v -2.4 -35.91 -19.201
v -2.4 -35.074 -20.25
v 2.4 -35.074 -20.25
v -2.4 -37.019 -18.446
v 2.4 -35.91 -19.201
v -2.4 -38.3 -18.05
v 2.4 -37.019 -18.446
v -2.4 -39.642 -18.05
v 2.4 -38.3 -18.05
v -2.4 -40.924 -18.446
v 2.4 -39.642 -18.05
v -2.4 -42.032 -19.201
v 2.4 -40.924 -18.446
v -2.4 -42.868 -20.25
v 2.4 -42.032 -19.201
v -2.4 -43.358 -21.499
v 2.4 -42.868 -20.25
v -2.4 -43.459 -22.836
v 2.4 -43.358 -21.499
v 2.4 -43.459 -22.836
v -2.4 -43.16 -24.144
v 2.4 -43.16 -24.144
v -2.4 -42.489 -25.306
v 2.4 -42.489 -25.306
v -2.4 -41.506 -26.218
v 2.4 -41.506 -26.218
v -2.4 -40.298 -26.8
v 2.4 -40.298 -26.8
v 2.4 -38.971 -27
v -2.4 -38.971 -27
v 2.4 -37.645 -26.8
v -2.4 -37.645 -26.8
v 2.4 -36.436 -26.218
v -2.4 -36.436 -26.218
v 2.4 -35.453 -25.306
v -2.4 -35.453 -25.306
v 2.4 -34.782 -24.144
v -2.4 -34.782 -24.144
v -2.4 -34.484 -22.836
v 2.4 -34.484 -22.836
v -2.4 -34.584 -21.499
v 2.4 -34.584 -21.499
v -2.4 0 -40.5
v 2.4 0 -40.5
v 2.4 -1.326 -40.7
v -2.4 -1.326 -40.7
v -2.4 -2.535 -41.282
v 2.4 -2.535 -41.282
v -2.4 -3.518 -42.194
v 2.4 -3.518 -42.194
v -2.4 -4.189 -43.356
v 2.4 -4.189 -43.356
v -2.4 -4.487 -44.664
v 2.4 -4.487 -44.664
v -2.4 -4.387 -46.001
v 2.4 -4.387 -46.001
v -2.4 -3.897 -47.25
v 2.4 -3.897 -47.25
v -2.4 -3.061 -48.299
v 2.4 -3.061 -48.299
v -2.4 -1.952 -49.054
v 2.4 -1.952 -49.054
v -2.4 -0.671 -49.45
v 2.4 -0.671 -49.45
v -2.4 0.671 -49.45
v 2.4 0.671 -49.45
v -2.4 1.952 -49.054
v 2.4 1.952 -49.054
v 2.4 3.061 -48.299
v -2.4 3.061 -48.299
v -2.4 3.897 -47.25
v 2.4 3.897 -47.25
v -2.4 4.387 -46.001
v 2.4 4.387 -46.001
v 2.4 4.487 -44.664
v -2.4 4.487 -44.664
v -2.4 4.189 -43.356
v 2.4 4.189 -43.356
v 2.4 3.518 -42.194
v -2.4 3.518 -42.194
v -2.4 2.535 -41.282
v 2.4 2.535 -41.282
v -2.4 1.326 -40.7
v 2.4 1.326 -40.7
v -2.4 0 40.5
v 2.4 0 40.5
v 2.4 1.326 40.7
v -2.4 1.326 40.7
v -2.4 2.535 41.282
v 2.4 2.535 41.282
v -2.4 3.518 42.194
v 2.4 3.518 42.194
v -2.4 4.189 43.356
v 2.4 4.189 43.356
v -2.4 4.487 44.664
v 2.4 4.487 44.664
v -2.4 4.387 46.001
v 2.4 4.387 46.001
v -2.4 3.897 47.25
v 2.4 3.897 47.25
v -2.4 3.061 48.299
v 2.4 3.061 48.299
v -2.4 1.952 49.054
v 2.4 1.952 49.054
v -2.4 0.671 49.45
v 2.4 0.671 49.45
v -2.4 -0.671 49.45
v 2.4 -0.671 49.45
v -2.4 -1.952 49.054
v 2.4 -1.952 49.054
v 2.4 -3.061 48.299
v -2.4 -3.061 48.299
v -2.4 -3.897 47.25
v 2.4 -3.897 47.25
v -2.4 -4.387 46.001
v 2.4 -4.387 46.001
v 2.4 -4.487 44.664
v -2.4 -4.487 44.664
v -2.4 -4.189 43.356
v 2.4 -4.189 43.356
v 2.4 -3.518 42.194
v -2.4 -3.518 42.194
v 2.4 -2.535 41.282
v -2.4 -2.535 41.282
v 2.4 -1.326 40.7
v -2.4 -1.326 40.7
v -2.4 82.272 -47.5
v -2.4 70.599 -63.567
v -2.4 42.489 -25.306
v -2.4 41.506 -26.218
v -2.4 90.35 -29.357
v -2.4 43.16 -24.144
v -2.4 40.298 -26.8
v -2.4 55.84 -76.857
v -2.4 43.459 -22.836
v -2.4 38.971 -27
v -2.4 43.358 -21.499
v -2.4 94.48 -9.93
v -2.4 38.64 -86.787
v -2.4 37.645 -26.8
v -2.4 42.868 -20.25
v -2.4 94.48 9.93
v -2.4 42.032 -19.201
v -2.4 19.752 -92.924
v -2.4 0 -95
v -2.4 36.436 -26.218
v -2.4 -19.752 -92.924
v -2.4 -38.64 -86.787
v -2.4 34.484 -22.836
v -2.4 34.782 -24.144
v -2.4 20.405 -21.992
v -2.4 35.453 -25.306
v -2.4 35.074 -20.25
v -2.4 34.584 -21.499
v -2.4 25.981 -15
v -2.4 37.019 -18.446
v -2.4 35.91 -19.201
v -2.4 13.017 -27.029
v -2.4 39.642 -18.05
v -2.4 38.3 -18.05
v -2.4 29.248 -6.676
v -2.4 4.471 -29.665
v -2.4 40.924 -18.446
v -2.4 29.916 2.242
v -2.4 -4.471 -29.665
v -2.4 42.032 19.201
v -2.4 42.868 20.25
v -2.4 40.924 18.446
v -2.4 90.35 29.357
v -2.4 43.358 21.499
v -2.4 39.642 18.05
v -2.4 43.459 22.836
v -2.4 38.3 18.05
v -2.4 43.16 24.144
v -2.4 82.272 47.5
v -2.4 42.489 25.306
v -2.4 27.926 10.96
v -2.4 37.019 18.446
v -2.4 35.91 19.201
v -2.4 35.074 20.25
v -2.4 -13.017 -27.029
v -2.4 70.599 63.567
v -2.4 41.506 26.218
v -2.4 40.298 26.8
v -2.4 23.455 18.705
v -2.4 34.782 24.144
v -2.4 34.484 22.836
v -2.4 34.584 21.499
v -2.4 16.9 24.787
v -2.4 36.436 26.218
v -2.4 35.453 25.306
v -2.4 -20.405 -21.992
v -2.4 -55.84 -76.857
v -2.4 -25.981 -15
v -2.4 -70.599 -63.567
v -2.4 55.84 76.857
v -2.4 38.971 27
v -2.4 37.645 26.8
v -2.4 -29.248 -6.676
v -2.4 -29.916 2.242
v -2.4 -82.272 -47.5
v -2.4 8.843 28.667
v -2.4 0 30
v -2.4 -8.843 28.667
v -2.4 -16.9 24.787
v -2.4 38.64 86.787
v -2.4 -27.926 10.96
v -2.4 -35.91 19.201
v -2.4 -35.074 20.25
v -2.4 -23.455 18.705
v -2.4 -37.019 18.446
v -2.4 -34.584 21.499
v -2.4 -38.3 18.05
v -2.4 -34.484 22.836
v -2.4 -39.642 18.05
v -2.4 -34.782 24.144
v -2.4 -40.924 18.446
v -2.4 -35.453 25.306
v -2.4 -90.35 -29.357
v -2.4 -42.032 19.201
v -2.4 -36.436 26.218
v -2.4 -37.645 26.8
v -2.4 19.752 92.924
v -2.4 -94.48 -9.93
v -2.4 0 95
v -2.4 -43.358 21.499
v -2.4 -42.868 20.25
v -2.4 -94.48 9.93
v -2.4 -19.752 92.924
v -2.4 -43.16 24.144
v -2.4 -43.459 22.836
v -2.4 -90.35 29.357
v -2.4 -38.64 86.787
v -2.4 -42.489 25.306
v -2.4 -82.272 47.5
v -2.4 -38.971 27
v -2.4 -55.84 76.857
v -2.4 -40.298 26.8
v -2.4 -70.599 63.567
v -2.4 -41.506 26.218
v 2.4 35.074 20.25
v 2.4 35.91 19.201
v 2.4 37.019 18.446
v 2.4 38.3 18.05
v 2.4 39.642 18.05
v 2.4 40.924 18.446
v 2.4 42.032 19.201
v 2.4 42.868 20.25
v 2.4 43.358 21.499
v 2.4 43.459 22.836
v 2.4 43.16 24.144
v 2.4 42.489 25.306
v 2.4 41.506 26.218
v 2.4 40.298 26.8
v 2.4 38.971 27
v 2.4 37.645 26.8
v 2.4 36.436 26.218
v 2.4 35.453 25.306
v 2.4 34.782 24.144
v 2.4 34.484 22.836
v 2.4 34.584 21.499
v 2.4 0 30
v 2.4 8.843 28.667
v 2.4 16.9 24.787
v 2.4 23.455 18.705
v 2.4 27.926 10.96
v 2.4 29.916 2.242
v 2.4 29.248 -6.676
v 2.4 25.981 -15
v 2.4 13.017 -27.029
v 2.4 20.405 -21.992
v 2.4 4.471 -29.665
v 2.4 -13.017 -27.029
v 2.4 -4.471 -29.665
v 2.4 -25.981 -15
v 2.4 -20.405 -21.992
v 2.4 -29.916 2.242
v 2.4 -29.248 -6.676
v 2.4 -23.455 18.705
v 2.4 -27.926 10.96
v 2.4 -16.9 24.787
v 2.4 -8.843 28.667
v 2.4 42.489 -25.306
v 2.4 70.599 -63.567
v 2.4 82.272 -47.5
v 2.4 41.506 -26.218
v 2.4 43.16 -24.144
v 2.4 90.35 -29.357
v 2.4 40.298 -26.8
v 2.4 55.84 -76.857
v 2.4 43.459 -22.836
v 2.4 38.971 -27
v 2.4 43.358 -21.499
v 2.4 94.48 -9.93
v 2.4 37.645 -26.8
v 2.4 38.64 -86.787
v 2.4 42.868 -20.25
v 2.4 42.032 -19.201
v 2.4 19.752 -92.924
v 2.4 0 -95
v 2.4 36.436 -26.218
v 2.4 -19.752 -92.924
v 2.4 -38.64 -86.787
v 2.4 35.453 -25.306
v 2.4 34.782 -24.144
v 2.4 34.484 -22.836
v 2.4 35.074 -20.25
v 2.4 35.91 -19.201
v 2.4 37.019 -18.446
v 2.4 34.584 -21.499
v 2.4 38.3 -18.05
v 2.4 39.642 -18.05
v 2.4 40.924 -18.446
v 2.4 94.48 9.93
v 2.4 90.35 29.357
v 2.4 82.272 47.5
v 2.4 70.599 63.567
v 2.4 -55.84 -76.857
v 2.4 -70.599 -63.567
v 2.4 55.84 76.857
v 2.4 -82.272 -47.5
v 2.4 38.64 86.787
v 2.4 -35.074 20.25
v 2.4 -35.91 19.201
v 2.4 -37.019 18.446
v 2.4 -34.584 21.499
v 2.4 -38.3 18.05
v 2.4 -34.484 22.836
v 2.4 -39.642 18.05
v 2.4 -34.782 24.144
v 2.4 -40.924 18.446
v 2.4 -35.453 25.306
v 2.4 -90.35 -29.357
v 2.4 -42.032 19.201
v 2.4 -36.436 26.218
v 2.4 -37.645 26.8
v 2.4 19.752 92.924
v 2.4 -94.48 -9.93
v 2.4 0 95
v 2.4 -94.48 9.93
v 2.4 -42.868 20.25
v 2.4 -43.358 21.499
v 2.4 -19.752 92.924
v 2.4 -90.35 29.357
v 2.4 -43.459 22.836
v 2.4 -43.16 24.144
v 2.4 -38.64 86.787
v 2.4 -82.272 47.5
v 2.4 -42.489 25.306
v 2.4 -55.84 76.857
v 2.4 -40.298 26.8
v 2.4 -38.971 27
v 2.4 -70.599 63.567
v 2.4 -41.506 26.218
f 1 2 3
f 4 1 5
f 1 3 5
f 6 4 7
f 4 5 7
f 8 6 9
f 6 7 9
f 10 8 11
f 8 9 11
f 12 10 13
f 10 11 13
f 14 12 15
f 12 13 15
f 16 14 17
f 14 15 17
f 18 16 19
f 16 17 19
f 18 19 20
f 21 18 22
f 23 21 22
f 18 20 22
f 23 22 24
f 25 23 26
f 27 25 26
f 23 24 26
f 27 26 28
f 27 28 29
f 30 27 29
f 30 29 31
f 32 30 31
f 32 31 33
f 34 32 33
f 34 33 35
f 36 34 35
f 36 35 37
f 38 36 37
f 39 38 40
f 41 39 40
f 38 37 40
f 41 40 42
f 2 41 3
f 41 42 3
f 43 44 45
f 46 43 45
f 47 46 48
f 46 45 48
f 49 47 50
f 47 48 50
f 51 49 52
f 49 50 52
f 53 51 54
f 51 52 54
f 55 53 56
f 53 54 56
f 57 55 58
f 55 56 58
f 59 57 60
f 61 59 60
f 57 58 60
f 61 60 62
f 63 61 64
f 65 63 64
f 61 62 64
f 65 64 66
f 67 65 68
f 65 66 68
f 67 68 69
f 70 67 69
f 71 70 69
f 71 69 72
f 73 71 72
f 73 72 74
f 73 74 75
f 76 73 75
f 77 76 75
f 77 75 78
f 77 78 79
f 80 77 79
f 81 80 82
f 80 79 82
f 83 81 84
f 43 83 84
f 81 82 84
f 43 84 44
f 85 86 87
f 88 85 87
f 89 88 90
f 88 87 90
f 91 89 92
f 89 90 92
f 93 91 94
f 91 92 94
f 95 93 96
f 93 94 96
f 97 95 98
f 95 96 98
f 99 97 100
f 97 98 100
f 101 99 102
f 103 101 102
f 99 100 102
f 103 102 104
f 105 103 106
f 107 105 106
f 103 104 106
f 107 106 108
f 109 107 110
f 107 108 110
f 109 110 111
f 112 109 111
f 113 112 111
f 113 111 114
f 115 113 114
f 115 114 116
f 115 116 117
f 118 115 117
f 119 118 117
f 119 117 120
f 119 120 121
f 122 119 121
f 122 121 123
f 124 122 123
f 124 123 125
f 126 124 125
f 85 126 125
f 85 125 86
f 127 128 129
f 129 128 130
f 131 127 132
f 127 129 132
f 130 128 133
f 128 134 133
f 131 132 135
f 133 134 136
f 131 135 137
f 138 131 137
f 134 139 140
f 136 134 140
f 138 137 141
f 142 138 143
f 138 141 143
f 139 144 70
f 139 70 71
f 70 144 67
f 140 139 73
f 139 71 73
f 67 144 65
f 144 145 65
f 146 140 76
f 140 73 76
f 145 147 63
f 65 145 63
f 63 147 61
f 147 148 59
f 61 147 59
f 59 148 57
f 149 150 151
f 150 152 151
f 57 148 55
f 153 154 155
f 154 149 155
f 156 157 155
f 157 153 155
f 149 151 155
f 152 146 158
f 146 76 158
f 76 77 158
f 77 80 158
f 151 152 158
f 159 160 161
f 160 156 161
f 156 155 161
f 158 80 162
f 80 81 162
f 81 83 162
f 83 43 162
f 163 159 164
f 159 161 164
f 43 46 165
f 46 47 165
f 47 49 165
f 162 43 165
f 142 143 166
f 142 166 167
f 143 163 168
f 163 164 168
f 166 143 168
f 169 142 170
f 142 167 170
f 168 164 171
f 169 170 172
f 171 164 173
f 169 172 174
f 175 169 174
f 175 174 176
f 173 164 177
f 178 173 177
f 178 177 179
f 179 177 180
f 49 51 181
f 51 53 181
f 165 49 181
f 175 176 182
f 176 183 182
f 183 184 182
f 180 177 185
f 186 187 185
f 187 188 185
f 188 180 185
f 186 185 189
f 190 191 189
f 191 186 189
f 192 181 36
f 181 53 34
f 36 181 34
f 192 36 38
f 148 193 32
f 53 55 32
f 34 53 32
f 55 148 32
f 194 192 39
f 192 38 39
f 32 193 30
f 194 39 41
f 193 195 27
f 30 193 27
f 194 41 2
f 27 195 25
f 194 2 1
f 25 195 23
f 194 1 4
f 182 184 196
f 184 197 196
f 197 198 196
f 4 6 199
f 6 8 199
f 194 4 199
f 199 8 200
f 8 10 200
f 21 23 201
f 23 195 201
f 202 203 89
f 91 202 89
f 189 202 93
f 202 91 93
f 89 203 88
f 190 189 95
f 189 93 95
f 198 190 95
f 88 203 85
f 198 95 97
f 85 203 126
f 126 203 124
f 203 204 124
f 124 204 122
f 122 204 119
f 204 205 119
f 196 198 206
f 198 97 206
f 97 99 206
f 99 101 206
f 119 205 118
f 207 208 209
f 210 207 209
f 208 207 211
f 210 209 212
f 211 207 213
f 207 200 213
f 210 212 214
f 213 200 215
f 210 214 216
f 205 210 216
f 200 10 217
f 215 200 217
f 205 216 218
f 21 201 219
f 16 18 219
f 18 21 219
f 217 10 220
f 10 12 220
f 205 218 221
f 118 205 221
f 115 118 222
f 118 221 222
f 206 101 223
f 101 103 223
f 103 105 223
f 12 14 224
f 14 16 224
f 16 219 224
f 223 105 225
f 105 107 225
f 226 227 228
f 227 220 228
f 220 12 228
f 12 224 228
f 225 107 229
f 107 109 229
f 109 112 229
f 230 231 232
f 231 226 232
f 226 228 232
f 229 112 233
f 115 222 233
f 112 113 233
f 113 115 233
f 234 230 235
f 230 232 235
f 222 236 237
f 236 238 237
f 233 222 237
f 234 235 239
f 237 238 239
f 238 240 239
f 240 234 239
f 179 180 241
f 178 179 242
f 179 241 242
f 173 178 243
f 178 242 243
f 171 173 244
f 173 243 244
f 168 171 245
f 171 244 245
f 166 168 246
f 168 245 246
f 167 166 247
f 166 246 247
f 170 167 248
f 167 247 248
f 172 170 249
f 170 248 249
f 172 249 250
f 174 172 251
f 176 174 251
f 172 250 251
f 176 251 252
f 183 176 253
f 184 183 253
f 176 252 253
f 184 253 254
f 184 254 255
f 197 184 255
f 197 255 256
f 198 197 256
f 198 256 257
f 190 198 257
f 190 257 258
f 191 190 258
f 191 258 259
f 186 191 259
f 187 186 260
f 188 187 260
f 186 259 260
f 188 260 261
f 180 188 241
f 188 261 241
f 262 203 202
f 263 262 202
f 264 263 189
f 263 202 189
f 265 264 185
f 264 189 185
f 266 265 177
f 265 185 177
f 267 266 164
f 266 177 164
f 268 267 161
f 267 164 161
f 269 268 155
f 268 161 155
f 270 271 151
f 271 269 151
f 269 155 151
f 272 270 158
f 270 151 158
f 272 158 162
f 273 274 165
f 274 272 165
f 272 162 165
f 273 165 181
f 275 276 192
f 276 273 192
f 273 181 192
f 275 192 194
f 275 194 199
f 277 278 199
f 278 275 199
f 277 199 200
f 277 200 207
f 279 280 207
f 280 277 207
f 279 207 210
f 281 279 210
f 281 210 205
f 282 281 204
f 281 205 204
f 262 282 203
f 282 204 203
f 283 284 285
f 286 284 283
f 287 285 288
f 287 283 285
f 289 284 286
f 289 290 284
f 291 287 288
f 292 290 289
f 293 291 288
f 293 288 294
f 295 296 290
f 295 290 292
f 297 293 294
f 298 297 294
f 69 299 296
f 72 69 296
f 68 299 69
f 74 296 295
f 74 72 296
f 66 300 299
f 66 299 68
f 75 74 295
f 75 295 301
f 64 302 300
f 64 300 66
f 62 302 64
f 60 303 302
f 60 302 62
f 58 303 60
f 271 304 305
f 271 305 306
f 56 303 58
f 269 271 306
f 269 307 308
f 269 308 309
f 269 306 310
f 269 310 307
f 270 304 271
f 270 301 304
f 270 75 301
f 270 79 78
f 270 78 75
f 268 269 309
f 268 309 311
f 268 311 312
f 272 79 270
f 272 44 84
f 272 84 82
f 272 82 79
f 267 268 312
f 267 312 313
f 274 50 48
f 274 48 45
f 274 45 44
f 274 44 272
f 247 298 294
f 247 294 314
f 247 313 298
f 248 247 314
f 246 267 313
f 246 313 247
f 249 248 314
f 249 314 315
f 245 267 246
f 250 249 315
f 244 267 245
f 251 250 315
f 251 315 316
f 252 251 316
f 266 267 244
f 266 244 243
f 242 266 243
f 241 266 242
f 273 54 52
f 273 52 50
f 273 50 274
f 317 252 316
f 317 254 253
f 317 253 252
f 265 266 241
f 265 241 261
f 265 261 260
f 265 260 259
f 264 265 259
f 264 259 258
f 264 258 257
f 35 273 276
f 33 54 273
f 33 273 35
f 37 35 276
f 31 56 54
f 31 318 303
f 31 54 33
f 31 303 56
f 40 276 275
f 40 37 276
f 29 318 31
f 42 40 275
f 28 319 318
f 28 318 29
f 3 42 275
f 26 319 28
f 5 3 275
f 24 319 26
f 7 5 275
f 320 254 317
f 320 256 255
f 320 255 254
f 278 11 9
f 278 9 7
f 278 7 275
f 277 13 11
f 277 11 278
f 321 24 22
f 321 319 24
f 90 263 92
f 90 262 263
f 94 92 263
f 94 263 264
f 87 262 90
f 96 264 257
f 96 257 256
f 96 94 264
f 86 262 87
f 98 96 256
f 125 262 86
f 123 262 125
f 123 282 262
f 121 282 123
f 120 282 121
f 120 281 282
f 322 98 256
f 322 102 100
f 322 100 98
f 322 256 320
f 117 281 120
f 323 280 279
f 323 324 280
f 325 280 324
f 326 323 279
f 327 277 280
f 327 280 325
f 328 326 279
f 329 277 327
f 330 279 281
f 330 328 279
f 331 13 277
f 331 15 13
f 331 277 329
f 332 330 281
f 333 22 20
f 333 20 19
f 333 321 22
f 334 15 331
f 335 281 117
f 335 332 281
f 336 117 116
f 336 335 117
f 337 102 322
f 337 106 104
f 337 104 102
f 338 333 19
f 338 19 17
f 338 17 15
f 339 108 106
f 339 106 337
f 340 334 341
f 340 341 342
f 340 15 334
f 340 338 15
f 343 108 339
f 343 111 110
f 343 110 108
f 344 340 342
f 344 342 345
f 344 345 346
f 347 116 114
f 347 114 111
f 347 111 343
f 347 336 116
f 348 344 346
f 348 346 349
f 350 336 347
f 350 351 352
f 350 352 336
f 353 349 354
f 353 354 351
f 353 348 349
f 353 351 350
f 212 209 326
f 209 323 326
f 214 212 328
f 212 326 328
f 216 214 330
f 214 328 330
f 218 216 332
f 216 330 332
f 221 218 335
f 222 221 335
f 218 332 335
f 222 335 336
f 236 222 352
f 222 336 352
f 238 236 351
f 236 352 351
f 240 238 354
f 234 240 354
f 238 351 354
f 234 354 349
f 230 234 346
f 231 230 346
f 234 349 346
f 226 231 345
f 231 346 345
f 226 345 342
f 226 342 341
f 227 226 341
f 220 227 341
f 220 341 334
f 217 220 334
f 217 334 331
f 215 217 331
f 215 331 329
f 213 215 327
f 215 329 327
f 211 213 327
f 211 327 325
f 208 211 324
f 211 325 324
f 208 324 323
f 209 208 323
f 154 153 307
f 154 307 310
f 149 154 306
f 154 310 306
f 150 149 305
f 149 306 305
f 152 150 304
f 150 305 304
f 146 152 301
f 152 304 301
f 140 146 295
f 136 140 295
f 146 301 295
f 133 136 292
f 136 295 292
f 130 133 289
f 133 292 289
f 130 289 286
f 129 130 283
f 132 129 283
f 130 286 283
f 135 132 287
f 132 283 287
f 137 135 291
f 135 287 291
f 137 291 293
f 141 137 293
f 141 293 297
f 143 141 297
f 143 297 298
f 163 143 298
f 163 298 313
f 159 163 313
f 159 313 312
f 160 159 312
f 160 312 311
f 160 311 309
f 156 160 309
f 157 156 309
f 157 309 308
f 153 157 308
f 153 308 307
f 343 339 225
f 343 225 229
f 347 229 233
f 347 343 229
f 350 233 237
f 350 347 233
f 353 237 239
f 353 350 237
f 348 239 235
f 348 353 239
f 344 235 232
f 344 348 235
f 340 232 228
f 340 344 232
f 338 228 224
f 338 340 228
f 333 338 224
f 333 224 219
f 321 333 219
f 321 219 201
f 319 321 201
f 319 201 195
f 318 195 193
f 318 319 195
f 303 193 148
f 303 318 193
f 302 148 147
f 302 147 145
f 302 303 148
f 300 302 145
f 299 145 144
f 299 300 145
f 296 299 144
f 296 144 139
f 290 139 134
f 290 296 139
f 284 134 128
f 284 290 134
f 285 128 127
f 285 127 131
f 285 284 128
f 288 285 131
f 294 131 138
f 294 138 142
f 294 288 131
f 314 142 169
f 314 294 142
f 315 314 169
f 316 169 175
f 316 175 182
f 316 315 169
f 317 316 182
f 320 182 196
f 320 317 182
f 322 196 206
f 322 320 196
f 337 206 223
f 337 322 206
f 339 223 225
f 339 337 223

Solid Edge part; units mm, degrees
sketch "Sketch1" plane through (0, 0, 0) normal (0, -1, 0) x (1, 0, 0)
  line L0 (-2.4, 95) -> (2.4, 95)
  line L1 (2.4, 95) -> (2.4, 30)
  line L2 (2.4, 30) -> (-2.4, 30)
  line L3 (-2.4, 30) -> (-2.4, 95)
  dimension "D1" = 4.8
  dimension "D2" = 95
  dimension "D3" = 30
revolve "RevolvedProtrusion1" add sketch "Sketch1" angle 360 about axis through (-60, 0, 0) along (1, 0, 0)
hole "Hole1" at (2.4, 0, 45) direction (-1, 0, 0) diameter 9 end up to next
pattern_circular "Pattern1" count 6 over 360 about axis through (2.4, 0, 0) along (-1, 0, 0) of "Hole1"
properties material "Stainless Steel, 420"
